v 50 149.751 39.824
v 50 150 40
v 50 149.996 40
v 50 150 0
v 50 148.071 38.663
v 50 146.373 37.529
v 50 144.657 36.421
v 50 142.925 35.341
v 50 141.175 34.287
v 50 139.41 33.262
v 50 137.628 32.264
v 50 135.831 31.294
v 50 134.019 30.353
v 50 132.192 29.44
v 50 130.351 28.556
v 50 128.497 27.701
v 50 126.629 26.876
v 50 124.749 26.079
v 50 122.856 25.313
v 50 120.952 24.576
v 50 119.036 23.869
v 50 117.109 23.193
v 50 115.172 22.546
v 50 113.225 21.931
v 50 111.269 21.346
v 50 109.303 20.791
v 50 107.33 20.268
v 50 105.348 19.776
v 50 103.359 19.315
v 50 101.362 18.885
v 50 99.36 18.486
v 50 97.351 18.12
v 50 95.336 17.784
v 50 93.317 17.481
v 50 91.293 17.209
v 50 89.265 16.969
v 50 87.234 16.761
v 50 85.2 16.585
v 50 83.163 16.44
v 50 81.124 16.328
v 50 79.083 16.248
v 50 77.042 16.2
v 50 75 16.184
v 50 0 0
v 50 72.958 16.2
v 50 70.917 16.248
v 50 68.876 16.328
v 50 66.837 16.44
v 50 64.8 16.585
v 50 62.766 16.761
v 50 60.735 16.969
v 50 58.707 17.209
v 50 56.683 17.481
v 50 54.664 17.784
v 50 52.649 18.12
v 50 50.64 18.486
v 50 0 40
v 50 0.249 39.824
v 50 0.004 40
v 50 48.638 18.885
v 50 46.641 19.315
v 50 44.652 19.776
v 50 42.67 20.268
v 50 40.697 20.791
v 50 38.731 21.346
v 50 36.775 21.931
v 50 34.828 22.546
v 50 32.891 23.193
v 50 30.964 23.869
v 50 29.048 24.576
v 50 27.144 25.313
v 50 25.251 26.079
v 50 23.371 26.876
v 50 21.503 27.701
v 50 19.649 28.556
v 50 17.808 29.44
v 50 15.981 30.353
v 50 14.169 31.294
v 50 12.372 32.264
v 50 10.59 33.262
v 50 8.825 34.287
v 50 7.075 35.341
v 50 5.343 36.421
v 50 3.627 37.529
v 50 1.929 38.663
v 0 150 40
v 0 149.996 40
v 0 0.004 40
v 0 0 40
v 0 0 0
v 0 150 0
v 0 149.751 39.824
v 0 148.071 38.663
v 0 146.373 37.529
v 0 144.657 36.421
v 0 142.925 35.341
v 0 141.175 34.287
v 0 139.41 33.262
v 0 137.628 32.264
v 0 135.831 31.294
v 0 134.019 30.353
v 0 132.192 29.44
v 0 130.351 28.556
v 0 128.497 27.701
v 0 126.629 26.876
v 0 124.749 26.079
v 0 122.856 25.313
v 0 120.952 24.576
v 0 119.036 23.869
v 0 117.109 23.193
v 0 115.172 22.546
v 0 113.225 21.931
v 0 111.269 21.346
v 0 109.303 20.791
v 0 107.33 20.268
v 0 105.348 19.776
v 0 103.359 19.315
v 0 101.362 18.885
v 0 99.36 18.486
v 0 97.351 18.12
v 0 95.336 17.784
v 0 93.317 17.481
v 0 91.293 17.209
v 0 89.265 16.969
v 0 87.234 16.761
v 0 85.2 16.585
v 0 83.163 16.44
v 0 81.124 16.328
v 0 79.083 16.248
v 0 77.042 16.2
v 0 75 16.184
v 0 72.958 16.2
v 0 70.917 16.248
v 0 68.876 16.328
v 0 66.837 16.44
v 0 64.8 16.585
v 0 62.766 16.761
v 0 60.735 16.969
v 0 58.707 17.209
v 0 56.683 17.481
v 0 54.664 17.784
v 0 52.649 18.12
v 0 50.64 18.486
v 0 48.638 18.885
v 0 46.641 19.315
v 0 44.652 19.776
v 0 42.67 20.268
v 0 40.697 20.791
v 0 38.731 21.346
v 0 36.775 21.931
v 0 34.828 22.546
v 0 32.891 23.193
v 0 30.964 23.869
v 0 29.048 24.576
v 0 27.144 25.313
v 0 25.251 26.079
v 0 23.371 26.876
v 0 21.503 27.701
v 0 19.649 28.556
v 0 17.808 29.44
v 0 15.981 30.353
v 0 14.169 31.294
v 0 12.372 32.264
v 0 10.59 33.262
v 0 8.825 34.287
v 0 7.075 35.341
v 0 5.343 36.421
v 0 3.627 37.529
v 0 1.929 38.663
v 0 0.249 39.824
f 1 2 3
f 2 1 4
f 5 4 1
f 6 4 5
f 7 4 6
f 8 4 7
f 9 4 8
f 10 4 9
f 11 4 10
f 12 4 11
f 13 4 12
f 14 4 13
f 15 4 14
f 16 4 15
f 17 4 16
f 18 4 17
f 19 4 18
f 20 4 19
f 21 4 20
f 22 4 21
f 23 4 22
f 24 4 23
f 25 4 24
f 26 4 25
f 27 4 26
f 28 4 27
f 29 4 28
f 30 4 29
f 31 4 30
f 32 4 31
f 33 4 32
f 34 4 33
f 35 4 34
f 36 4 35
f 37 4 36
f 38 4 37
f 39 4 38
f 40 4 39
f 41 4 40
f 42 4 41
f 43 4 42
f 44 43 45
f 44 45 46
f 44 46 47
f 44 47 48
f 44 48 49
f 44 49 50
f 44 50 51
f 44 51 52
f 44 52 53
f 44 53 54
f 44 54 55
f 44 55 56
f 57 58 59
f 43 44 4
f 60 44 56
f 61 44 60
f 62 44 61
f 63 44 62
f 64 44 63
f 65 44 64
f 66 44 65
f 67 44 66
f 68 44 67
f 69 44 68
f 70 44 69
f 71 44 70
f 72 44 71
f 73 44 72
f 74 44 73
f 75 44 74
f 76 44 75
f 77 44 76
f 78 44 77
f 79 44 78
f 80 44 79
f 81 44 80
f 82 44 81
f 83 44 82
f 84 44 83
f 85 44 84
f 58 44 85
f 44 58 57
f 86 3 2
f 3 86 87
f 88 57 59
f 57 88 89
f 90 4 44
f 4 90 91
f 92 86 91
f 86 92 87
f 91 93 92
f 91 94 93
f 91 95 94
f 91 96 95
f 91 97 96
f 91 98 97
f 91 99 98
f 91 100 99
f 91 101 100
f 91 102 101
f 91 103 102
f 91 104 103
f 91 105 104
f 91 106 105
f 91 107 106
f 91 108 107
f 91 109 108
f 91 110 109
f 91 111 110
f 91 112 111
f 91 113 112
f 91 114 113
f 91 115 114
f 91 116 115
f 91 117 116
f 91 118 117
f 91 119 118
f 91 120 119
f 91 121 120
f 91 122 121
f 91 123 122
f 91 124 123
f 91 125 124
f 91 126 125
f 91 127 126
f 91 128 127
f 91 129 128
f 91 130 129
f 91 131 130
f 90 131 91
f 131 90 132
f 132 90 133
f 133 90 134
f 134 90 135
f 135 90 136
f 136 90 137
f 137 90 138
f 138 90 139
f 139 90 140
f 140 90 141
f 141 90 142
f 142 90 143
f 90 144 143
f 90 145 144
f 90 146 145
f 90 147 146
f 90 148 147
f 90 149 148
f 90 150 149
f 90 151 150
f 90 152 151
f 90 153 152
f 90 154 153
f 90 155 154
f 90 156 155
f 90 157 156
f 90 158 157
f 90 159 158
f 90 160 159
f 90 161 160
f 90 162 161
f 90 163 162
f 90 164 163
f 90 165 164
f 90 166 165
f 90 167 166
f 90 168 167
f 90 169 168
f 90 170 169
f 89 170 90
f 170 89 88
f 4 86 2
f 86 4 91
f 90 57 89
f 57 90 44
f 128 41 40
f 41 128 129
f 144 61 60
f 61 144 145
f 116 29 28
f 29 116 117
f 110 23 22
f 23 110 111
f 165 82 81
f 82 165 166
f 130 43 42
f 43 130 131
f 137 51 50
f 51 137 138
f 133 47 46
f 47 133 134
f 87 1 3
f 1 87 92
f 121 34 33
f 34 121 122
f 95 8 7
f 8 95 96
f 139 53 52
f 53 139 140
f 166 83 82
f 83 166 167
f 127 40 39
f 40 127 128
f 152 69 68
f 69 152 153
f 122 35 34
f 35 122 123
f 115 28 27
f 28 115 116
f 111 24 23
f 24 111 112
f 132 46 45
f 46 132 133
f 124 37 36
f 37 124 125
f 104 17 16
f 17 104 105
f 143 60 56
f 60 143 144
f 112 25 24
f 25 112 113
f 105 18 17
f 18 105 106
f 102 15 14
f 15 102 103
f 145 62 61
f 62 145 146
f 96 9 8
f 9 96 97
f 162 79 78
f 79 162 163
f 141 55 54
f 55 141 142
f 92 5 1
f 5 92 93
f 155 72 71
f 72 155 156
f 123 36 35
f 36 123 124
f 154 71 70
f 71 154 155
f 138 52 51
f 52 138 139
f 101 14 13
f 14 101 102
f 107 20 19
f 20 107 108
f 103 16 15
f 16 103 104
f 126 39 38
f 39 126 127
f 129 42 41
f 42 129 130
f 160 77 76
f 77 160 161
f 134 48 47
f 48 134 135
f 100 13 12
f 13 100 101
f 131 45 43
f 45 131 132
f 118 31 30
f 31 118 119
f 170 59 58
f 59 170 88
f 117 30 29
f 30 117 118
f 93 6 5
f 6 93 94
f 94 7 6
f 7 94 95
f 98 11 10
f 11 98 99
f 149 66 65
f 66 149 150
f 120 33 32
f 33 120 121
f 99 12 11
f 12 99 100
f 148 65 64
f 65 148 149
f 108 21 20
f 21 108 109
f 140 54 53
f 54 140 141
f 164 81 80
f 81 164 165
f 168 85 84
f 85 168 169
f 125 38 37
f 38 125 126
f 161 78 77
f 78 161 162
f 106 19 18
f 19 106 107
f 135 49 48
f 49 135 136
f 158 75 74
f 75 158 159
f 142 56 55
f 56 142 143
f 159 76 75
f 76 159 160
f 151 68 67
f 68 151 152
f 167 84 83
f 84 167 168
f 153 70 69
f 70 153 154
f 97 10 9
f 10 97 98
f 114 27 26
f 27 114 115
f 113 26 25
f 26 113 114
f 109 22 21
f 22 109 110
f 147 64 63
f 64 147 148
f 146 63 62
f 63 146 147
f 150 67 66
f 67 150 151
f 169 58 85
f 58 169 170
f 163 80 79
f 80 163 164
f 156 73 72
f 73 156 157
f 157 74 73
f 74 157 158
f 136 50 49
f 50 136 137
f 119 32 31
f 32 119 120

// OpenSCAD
/*
 * file: drum-stand.scad
 * author: gregor binder <gregor_reprap@catrix.at>
 * date: 03.12.2013
 * last change: 03.12.2013
 * license: CC BY-NC-SA 4.0
 */

r_front=260/2;
width=150;
thickness=50;
height=40;
$fn=400;

/****************/

h=r_front-(1/2)*sqrt(4*r_front*r_front-width*width);
//h=10;

//rotate([0,90,0])
difference() {
	cube([thickness,width,height]);
	translate([-0.5,width/2,r_front+height-h])
		rotate([0,90,0])
			cylinder(h=thickness+5,r=r_front);
}
